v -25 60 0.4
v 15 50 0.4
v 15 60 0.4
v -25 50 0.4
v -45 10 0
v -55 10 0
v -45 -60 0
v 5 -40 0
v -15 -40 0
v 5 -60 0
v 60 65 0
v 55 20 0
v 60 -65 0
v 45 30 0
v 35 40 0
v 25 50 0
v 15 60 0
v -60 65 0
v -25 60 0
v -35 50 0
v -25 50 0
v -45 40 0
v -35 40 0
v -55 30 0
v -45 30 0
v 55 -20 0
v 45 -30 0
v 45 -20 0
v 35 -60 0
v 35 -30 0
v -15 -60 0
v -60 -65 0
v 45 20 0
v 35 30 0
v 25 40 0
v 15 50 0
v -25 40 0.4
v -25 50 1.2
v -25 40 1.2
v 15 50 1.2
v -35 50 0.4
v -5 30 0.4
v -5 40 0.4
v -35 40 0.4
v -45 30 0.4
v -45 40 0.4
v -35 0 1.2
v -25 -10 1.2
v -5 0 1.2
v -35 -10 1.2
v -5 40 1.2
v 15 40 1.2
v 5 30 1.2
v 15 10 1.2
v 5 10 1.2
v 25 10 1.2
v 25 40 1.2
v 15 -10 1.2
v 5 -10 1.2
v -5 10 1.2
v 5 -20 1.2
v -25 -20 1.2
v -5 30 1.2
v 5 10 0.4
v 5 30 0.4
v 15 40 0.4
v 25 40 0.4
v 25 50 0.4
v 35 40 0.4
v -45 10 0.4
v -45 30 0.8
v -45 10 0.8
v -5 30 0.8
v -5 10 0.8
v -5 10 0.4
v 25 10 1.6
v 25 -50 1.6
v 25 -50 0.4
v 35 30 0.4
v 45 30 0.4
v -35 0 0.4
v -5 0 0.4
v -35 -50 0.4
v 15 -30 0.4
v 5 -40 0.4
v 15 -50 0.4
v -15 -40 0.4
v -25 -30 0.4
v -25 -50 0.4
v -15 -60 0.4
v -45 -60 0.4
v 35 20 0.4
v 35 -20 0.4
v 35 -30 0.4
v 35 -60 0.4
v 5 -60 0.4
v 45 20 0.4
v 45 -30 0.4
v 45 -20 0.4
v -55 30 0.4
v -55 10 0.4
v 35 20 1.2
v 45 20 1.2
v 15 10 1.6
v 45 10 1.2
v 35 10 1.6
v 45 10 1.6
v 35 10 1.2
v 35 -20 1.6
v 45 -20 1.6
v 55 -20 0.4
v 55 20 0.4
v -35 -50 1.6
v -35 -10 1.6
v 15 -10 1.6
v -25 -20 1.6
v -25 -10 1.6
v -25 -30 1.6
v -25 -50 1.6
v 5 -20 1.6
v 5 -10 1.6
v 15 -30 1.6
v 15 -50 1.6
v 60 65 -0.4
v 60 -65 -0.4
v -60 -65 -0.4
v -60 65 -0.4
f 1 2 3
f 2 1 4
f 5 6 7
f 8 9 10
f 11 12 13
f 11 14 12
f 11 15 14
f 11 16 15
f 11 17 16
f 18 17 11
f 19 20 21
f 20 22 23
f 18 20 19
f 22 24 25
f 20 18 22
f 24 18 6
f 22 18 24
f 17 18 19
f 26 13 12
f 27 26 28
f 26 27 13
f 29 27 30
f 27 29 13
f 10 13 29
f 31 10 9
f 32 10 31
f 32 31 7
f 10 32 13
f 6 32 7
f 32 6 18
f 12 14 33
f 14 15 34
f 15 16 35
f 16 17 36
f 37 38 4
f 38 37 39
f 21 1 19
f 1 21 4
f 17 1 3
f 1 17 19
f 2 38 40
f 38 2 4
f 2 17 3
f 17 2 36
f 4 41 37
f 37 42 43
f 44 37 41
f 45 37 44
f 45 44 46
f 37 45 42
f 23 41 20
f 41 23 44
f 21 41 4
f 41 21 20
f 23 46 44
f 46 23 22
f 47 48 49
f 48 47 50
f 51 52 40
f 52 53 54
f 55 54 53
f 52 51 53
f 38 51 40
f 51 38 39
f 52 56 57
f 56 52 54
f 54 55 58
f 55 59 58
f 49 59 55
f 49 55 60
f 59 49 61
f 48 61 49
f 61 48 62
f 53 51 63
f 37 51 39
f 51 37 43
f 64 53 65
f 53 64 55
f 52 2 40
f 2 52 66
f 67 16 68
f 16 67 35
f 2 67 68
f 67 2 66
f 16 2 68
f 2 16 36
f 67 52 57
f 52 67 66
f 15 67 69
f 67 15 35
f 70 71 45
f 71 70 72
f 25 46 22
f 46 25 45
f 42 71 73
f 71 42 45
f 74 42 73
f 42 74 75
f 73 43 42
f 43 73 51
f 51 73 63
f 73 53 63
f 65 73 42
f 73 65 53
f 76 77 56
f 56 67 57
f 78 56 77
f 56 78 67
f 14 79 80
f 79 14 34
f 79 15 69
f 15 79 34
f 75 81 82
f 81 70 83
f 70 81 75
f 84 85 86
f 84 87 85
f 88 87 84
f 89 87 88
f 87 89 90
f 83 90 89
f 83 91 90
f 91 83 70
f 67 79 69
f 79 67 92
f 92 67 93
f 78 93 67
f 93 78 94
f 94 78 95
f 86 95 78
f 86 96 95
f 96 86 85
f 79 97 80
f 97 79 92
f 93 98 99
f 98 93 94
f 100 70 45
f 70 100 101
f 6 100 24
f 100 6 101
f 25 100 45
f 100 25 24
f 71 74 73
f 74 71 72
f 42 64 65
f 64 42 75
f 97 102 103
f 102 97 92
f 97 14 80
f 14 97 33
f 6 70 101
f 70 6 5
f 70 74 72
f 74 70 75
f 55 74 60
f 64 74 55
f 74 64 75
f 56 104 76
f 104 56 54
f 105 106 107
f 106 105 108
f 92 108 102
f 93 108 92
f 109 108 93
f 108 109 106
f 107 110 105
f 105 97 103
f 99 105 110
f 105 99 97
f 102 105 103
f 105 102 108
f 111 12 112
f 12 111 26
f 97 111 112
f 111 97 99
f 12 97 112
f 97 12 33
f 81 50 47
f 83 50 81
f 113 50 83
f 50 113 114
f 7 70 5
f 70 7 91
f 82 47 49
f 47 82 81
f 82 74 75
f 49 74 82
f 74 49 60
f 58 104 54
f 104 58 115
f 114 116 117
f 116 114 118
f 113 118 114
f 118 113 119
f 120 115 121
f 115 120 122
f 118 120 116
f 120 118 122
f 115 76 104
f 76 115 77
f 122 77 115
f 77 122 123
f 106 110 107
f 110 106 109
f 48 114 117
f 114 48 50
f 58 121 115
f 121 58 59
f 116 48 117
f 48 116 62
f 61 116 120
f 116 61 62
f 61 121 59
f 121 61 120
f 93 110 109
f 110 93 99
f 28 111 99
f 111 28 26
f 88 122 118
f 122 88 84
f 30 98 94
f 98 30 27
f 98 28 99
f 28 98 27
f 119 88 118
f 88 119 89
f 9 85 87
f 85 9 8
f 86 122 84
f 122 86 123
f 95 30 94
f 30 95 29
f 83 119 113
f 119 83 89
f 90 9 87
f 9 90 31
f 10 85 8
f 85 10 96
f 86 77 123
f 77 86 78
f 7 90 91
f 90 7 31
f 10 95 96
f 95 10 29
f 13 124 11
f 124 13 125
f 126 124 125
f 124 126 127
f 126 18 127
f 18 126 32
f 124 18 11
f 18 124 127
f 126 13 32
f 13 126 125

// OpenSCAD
step = 0.4;   // height of steps
size = 10;  // width of squares
base = 1;   // 0/1 for off/on

colors = ["black", "white", [0.647, 0.282, 0.965], [0.373, 0.122, 0.871]];

file =              // this is the image you create
[[0, 0, 0, 1, 1, 1, 1, 0, 0, 0, 0],   // '0' for 'empty/none'
[0, 0, 1, 3, 3, 3, 3, 1, 0, 0, 0],
[0, 1, 1, 1, 1, 3, 3, 3, 1, 0, 0],
[1, 2, 2, 2, 2, 1, 3, 3, 1, 1, 0],
[1, 2, 2, 2, 2, 1, 3, 3, 1, 3, 1],
[0, 1, 1, 1, 1, 3, 3, 4, 1, 4, 1],
[0, 1, 3, 3, 3, 3, 3, 4, 1, 4, 1],
[0, 1, 4, 3, 3, 3, 4, 4, 1, 4, 1],
[0, 1, 4, 4, 4, 4, 4, 4, 1, 1, 0],
[0, 1, 4, 1, 1, 1, 1, 4, 1, 0, 0],
[0, 1, 4, 1, 0, 0, 1, 4, 1, 0, 0],
[0, 1, 1, 1, 0, 0, 1, 1, 1, 0, 0]];

translate([-len(file[0])*size/2, len(file)*size/2])
for (i = [0 :len(file)-1], j = [0 : len(file[0])-1])
    translate([j, -i-1, 0]*size) 
        color(colors[ (file[i][j] -1) %len(colors) ]) 
            cube([size, size, step * file[i][j]], false);

if (base == 1) 
    translate([0, 0, -step/2]) 
cube([(len(file[0])+1)*size, (len(file)+1)*size, step], true);
